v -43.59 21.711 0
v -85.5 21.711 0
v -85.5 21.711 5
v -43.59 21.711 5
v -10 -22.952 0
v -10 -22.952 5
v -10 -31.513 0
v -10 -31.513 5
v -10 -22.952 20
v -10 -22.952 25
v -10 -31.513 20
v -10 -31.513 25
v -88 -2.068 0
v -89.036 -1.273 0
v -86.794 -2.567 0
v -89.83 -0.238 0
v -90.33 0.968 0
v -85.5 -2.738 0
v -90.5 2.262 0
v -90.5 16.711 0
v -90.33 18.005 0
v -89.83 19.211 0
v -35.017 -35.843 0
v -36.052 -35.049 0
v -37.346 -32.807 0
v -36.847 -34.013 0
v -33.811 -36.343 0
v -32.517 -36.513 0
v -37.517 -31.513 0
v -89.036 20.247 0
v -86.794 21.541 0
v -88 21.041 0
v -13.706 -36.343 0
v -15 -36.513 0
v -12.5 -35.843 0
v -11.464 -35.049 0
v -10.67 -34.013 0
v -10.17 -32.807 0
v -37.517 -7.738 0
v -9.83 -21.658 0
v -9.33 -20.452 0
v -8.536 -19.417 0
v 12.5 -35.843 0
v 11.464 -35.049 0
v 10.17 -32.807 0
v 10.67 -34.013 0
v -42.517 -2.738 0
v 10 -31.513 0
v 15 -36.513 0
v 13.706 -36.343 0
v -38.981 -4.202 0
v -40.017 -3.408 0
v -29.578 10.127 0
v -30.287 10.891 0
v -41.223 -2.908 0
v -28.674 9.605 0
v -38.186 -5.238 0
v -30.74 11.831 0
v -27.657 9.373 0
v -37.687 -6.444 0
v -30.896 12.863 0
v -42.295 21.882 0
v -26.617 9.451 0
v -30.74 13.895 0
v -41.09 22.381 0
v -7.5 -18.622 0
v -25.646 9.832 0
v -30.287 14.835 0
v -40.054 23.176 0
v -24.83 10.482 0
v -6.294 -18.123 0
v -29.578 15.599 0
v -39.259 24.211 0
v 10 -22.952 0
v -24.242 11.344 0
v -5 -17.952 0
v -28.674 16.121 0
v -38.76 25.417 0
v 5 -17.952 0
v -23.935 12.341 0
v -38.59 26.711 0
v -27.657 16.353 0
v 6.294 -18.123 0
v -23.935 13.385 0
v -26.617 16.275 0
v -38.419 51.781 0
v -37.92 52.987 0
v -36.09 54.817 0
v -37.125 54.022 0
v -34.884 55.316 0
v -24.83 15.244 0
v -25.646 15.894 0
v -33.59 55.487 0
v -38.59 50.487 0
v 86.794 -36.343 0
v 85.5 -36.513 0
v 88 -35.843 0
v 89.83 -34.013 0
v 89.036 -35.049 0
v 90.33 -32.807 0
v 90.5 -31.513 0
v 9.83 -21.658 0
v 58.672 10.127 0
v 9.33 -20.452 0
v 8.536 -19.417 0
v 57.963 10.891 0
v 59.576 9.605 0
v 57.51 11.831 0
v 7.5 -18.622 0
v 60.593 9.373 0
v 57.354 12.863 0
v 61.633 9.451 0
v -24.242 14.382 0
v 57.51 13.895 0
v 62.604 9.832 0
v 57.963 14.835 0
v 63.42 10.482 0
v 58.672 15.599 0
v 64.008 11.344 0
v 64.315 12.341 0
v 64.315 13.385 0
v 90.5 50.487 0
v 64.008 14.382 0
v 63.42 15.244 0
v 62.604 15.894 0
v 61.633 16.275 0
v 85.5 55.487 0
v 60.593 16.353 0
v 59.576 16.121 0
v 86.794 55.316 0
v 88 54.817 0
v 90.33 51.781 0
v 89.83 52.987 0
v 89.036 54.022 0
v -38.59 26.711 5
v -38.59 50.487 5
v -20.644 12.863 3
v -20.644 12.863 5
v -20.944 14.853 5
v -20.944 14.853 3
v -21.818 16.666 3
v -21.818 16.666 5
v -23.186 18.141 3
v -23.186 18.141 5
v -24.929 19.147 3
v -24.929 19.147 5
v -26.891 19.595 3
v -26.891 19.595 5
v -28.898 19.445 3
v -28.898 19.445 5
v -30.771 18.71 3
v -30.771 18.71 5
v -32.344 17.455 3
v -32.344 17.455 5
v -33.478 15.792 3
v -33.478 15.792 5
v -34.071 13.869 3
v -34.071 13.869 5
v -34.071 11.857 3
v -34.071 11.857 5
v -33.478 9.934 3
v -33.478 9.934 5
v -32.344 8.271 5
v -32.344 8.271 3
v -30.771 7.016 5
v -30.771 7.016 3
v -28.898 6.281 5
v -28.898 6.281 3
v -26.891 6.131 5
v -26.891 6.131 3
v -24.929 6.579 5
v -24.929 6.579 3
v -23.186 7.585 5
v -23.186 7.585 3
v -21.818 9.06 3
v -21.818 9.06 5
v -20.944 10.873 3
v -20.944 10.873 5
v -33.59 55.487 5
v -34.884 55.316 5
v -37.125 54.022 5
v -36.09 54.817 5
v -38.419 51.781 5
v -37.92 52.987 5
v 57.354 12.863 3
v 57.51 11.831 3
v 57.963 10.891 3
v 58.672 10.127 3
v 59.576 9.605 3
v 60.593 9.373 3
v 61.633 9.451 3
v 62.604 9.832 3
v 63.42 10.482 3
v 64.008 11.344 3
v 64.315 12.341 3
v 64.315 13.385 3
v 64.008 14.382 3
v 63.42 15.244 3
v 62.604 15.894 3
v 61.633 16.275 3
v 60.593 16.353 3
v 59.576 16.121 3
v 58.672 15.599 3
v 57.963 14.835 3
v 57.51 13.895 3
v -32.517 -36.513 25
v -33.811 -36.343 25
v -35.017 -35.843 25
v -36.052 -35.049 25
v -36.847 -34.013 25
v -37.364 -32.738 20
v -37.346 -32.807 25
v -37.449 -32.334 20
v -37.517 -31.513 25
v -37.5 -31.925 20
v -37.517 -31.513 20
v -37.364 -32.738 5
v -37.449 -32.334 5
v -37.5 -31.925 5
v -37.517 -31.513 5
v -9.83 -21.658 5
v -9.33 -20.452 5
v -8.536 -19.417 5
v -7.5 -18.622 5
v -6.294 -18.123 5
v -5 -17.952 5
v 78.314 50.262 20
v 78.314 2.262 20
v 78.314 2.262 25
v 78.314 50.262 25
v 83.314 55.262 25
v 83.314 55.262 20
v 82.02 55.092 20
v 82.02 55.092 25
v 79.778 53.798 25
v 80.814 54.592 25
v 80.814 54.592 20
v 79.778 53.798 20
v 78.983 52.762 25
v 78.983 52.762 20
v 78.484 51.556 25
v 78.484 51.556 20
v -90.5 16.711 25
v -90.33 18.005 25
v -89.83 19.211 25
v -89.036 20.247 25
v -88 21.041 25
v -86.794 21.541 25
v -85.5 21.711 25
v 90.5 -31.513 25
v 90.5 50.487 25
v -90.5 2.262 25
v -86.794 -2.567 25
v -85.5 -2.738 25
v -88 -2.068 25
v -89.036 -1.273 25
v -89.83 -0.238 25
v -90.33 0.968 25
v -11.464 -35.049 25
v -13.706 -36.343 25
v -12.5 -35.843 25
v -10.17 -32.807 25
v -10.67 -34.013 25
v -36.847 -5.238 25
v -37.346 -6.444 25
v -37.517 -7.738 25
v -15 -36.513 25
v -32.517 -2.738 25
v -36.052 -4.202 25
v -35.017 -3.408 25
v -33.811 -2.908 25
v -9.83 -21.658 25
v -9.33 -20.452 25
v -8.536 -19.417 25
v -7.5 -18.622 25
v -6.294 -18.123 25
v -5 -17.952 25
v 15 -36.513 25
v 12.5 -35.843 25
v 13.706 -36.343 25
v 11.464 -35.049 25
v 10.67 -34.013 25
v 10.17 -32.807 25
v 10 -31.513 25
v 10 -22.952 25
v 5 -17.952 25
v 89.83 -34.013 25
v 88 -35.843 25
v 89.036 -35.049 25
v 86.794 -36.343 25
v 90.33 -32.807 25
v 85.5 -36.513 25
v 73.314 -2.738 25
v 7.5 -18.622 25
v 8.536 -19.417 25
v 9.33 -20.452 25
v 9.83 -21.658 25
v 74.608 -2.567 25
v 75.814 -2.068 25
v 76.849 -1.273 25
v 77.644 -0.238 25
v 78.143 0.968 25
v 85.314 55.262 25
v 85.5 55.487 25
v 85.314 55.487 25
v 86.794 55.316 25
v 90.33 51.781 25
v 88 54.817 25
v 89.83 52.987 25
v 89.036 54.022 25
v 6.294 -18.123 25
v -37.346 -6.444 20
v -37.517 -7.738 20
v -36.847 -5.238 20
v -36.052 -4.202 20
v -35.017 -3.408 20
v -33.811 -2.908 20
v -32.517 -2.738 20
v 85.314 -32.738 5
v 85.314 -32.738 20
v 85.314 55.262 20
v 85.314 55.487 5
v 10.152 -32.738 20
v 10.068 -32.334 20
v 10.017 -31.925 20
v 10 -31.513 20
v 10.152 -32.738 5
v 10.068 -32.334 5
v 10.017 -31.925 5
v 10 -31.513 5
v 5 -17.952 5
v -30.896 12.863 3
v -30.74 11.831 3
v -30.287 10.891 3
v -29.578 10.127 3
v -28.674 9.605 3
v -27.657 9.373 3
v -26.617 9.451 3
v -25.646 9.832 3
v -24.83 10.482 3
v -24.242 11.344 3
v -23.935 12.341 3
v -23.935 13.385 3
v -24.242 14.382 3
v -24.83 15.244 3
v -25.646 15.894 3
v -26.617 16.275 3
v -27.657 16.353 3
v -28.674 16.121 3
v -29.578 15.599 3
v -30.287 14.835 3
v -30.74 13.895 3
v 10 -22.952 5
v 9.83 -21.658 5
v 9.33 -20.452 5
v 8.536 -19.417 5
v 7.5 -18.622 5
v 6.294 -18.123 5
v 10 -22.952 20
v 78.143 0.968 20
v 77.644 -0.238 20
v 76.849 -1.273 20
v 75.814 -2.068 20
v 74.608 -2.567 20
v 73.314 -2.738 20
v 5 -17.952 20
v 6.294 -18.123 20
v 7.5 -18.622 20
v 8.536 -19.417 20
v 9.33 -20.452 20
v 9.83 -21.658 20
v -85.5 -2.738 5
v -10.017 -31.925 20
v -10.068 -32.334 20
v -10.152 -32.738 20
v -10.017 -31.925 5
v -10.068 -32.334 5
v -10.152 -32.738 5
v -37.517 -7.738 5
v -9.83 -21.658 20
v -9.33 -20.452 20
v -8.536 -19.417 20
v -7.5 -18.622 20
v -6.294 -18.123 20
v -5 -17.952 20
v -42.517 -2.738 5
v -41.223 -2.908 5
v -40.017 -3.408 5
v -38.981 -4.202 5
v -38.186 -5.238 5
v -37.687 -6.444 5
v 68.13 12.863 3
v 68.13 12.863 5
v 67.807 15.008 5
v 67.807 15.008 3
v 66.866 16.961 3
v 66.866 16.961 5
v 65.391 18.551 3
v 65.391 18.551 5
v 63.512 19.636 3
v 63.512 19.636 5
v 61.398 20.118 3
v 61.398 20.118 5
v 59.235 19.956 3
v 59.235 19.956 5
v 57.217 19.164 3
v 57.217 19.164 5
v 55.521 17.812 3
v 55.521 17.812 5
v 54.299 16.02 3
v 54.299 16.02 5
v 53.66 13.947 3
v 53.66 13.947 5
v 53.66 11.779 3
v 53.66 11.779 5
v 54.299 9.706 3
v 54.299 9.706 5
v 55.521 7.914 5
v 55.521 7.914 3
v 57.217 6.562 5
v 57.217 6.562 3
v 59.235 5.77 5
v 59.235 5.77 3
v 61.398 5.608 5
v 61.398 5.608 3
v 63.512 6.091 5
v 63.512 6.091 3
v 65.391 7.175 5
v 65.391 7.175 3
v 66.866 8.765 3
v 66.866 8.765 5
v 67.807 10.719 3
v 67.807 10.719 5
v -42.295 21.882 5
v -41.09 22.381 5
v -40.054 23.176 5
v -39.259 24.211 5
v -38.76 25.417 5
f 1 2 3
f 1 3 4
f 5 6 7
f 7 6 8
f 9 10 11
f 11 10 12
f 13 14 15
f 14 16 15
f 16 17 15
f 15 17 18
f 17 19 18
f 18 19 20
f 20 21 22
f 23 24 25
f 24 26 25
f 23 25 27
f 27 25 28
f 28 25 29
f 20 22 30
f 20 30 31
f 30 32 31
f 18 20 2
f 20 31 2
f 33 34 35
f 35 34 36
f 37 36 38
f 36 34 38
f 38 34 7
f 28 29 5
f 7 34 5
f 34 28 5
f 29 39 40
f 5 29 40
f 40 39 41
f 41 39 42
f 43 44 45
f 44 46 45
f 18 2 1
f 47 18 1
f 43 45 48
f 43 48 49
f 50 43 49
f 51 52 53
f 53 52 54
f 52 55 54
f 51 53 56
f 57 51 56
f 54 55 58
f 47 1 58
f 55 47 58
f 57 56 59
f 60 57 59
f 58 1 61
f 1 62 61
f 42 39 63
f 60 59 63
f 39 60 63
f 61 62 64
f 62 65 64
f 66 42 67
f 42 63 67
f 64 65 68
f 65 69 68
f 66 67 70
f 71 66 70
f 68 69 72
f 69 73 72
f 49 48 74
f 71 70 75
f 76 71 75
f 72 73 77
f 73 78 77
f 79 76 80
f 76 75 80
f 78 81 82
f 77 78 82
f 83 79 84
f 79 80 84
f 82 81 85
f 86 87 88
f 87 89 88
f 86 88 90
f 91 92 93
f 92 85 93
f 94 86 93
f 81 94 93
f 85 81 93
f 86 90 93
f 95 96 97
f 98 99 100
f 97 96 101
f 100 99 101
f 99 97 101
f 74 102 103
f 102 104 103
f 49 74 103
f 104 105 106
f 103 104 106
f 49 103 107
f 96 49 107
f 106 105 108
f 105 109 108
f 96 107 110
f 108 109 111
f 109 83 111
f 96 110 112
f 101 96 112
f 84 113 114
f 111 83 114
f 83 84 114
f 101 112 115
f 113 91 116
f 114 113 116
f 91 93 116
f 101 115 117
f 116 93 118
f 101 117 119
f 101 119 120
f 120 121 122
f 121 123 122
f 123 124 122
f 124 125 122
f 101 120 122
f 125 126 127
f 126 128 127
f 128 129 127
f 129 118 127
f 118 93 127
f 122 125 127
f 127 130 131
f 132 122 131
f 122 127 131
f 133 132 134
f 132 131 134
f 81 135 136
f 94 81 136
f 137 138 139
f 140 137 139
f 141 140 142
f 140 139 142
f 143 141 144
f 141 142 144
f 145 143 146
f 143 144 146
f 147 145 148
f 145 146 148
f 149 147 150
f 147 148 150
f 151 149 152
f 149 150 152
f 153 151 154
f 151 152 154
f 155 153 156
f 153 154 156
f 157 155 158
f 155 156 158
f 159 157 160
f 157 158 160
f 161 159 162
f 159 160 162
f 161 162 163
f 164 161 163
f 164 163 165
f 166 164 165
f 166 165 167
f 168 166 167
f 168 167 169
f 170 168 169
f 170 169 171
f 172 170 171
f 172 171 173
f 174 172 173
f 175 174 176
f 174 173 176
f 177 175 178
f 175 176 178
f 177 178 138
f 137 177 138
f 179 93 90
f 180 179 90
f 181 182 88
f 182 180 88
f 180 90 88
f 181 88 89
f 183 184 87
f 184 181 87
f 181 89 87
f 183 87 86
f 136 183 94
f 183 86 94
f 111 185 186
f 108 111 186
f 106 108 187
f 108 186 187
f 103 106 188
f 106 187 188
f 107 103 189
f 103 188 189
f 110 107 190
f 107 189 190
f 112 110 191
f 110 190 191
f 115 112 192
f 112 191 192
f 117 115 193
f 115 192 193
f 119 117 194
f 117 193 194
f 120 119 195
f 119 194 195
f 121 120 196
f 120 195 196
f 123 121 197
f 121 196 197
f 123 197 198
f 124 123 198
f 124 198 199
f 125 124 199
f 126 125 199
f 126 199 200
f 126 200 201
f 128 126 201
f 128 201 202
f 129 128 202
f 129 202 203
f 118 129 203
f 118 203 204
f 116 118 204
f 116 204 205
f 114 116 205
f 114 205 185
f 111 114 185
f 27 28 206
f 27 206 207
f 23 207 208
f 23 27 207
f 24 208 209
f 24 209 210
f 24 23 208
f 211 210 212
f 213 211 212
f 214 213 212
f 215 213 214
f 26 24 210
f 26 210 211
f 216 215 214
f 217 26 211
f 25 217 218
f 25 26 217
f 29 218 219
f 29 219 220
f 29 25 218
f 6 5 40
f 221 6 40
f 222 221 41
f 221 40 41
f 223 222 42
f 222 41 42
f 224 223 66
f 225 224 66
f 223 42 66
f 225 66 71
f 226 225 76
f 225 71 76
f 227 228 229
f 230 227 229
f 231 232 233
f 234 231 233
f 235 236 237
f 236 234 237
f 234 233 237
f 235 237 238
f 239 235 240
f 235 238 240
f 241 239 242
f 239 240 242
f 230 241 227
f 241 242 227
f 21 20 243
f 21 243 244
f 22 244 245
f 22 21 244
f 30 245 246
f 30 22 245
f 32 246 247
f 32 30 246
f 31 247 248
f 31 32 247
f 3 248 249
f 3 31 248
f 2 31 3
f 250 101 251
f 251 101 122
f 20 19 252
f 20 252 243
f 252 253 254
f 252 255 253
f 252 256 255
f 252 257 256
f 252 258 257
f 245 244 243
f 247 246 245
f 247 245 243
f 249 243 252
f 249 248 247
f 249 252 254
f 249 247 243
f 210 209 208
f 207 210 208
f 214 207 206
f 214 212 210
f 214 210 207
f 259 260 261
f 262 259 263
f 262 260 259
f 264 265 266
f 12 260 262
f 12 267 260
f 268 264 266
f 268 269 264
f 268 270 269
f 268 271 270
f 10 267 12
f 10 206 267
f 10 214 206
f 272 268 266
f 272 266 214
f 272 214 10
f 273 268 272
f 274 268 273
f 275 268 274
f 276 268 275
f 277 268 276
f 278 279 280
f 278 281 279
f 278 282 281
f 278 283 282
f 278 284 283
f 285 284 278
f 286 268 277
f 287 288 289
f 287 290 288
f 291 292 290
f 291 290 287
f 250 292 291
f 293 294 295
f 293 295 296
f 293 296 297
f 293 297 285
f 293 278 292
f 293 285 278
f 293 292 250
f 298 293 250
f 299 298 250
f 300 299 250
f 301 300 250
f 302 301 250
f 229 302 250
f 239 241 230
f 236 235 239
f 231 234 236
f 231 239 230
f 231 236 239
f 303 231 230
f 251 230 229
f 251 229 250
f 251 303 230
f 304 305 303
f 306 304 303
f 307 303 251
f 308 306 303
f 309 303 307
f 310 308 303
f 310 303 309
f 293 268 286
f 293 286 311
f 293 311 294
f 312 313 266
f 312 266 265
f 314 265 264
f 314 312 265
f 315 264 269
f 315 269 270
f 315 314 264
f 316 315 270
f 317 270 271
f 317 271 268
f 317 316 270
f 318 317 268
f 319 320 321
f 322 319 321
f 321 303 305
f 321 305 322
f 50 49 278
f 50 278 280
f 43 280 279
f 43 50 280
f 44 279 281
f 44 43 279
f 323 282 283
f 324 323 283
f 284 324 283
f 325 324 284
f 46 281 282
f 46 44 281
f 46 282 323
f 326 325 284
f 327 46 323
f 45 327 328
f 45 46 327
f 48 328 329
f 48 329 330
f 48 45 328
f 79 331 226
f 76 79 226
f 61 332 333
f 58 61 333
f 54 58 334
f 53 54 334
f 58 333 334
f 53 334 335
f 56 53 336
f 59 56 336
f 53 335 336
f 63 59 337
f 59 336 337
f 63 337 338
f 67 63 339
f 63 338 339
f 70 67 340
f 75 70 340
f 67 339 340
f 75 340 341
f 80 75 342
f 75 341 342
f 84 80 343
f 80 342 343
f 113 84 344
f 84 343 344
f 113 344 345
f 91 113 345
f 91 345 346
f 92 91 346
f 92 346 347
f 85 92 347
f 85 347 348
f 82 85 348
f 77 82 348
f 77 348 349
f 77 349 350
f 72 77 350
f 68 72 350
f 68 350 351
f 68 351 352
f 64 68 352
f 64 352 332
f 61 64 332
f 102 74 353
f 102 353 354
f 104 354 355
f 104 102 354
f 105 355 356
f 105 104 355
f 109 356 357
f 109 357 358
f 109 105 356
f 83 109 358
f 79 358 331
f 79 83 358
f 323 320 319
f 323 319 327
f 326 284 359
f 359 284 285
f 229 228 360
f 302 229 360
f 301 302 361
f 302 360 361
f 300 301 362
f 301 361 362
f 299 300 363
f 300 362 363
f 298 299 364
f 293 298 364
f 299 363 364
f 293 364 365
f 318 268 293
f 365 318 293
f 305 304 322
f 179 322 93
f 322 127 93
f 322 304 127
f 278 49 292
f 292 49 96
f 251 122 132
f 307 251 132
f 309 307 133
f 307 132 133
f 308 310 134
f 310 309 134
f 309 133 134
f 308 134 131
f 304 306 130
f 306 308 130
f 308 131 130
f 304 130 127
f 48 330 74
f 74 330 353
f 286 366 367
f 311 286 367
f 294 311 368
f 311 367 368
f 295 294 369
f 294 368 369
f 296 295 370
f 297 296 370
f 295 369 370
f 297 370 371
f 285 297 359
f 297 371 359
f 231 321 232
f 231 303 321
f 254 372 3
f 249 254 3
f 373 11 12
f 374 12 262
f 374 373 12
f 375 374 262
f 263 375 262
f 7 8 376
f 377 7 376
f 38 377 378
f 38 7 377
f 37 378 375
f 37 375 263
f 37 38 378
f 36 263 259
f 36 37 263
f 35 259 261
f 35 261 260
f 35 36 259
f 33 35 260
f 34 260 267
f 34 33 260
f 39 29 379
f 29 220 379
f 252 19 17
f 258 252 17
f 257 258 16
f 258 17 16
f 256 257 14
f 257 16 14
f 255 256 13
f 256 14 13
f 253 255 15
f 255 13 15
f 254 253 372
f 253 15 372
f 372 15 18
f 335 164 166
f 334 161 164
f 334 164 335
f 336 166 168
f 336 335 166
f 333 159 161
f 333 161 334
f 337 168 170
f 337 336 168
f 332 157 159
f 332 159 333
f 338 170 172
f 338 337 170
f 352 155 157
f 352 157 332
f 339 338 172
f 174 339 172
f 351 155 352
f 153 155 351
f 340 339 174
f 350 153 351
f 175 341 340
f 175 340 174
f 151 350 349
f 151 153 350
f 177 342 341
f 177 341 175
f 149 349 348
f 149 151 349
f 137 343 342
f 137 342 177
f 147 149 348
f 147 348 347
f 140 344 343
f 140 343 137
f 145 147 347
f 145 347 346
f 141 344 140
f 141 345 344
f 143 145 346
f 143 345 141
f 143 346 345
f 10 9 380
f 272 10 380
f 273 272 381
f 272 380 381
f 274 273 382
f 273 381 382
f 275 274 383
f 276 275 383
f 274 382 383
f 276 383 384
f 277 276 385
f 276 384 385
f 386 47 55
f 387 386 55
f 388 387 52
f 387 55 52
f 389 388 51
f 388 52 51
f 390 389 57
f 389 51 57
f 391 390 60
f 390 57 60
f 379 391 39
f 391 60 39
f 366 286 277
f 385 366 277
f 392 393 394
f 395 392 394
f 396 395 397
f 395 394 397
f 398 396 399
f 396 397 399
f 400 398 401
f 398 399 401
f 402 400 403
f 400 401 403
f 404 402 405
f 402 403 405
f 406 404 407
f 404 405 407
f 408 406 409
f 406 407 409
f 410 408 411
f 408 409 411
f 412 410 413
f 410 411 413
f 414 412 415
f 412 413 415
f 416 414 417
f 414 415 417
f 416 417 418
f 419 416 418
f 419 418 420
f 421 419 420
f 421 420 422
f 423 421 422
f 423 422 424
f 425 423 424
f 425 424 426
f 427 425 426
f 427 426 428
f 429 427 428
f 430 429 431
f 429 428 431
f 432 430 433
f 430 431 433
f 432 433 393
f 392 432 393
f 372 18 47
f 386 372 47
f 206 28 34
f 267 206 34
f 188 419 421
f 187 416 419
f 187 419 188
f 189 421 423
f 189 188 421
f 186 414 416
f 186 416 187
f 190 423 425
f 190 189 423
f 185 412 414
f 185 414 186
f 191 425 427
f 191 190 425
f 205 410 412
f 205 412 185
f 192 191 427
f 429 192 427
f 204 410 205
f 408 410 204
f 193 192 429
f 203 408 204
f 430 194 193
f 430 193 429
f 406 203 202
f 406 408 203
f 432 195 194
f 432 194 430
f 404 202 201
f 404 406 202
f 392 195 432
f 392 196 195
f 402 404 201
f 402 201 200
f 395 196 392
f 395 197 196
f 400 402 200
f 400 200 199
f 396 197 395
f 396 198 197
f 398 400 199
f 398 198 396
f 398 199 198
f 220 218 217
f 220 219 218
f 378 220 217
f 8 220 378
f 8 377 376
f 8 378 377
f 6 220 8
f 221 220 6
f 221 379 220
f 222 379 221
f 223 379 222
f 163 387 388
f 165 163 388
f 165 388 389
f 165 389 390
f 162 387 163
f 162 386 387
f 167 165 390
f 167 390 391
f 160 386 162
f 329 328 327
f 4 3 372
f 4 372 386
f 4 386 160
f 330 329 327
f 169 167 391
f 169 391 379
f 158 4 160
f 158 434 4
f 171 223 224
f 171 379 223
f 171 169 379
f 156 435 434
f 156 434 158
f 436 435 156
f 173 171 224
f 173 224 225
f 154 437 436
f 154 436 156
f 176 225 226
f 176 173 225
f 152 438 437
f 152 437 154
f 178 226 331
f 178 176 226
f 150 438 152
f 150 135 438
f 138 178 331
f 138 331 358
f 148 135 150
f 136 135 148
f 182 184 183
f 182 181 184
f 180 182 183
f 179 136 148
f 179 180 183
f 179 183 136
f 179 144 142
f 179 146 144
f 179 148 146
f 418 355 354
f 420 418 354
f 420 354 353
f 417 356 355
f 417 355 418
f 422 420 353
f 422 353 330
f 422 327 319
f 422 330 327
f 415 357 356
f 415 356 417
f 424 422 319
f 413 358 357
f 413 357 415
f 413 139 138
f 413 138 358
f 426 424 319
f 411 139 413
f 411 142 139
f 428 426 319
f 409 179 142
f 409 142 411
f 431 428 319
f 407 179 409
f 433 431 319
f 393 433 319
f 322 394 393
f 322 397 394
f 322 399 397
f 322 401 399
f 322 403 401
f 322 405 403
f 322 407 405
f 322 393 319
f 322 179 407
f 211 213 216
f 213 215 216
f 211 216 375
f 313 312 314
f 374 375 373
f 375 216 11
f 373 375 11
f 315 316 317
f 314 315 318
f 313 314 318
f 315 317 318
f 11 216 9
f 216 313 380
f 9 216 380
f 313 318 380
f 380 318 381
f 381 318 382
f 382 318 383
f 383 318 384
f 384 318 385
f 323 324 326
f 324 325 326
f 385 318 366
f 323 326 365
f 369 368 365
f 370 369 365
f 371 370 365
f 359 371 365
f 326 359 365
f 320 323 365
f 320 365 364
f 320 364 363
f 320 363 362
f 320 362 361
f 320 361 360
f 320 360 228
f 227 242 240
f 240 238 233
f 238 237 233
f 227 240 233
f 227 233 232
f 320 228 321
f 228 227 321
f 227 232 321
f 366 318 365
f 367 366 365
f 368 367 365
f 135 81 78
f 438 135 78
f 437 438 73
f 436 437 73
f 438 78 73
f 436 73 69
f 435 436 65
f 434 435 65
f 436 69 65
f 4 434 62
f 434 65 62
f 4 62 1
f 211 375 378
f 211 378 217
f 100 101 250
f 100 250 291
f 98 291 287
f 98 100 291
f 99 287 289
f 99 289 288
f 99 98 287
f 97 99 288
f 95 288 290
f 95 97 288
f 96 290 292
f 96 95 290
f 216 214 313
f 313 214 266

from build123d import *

# Parameters (mm, degrees)
F1_DEPTH     = 25
F4_DEPTH     = 25
F6_DEPTH     = 20
F7_W         = 51.9104144033
F7_H         = 33.7755738664
F7_W_2       = 52.9833799657
F8_DEPTH     = 25
F9_W         = 5
F9_H         = 24.4488522671
F10_DEPTH    = 20
F11_W        = 120.8302378654
F11_H        = 15
F12_DEPTH    = 30
F14_DEPTH    = 6
F15_R        = 7.2754238601
F15_R_2      = 3.5
F15_R_3      = 6.751082942
F16_DEPTH    = 2
F17_W        = 5
F17_H        = 5
F18_DEPTH    = 58
F19_DEPTH    = 2
F20_T1_DEPTH = 5
F20_T3_DEPTH = 5
F20_T5_DEPTH = 50
F20_T7_DEPTH = 30
F20_T9_DEPTH = 30


# Not quite as in the source:
# - a fillet or chamfer that OpenCascade refuses, or shapes differently, is made with other operations: its cross-section is extruded or revolved along the edge and cut away or added
# - a feature names something its author has since deleted; it is built from what else it names


with BuildPart() as f1:
    # F0 (on Top) → F1 (new body)
    with BuildSketch(Plane.XY):
        Polygon((-25, 55.486739397), (-90.4999962505, 55.486739397), (-90.4999962505, -36.513260603), (90.5000037495, -36.513260603), (90.5000037495, 55.486739397), (25, 55.486739397), align=None)
    extrude(amount=F1_DEPTH)

    # F3 (on face) → F4 (cut)
    with BuildSketch(Plane.XY.offset(25)):
        Polygon((10, -17.952421695), (0, -17.952421695), (-10, -17.952421695), (-10, -30.3189372783), (0, -30.3189372783), (10, -30.3189372783), align=None)
        Polygon((10, -36.513260603), (10, -30.3189372783), (0, -30.3189372783), (-10, -30.3189372783), (-10, -36.513260603), align=None)
    extrude(amount=-F4_DEPTH, mode=Mode.SUBTRACT)

    # F5 (on face) → F6 (cut)
    with BuildSketch(Plane.XY.offset(25)):
        Polygon((83.3136215806, -2.7376867365), (83.3136215806, 55.486739397), (-90.4999962505, 55.486739397), (-90.4999962505, -36.513260603), (-37.5166162848, -36.513260603), (-37.5166162848, -2.7376867365), align=None)
    extrude(amount=-F6_DEPTH, mode=Mode.SUBTRACT)

    # F7 (on face) → F8 (cut)
    with BuildSketch(Plane.XY.offset(5)):
        with Locations((-64.5447890489, 38.5989524638)):
            Rectangle(F7_W, F7_H)
        with Locations((-64.0083062677, -19.6254736697)):
            Rectangle(F7_W_2, F7_H)
    extrude(amount=-F8_DEPTH, mode=Mode.SUBTRACT)

    # F9 (on face) → F10 (join)
    with BuildSketch(Plane.XY.offset(5)):
        with Locations((-87.9999962505, 9.486739397)):
            Rectangle(F9_W, F9_H)
    extrude(amount=F10_DEPTH)

    # F11 (on face) → F12 (cut)
    with BuildSketch(Plane(origin=(0, -2.7376867365, 0), x_dir=(-1, 0, 0), z_dir=(0, 1, 0))):
        with Locations((-22.8985026479, 12.5)):
            Rectangle(F11_W, F11_H)
    extrude(amount=-F12_DEPTH, mode=Mode.SUBTRACT)

    # F13 (on face) → F14 (cut)
    with BuildSketch(Plane.XY.offset(5)):
        with BuildLine():
            ThreePointArc((64.3544293493, 12.8630390391), (60.8544293493, 16.3630390391), (57.3544293493, 12.8630390391))
            Line((57.3544293493, 12.8630390391), (60.8544293493, 12.8630390391))
            Line((60.8544293493, 12.8630390391), (64.3544293493, 12.8630390391))
        make_face()
        with BuildLine():
            Line((60.8544293493, 12.8630390391), (57.3544293493, 12.8630390391))
            ThreePointArc((57.3544293493, 12.8630390391), (60.8544293493, 9.3630390391), (64.3544293493, 12.8630390391))
            Line((64.3544293493, 12.8630390391), (60.8544293493, 12.8630390391))
        make_face()
        with BuildLine():
            ThreePointArc((-23.8955706507, 12.8630390391), (-27.3955706507, 16.3630390391), (-30.8955706507, 12.8630390391))
            Line((-30.8955706507, 12.8630390391), (-27.3955706507, 12.8630390391))
            Line((-27.3955706507, 12.8630390391), (-23.8955706507, 12.8630390391))
        make_face()
        with BuildLine():
            Line((-27.3955706507, 12.8630390391), (-30.8955706507, 12.8630390391))
            ThreePointArc((-30.8955706507, 12.8630390391), (-27.3955706507, 9.3630390391), (-23.8955706507, 12.8630390391))
            Line((-23.8955706507, 12.8630390391), (-27.3955706507, 12.8630390391))
        make_face()
    extrude(amount=-F14_DEPTH, mode=Mode.SUBTRACT)

    # F15 (on face) → F16 (cut)
    with BuildSketch(Plane.XY.offset(5)):
        with Locations((60.8544293493, 12.8630390391)):
            Circle(F15_R)
        with Locations((60.8544293493, 12.8630390391)):
            Circle(F15_R_2, mode=Mode.SUBTRACT)
        with Locations((-27.3955706507, 12.8630390391)):
            Circle(F15_R_3)
        with Locations((-27.3955706507, 12.8630390391)):
            Circle(F15_R_2, mode=Mode.SUBTRACT)
    extrude(amount=-F16_DEPTH, mode=Mode.SUBTRACT)

    # F17 (on face) → F18 (join)
    with BuildSketch(Plane(origin=(0, -2.7376867365, 0), x_dir=(-1, 0, 0), z_dir=(0, 1, 0))):
        with Locations((-80.8136215806, 22.5)):
            Rectangle(F17_W, F17_H)
    extrude(amount=F18_DEPTH)

    # F19 (cut): a face of the model
    f19_faces = [f1.faces().sort_by_distance(p)[0] for p in [
        (83.3136215806, 11.4118039273, 12.5084721811),
    ]]
    extrude(f19_faces, amount=-F19_DEPTH, mode=Mode.SUBTRACT)

    # F20: fillet of radius 5 on 17 edges, made by hand

    # F20_s2 → F20_t1 (join)
    with BuildSketch(Plane.XY.offset(20)):
        with BuildLine():
            ThreePointArc((-10, -22.952421695), (-8.5355339059, -19.4168877891), (-5, -17.952421695))
            Line((-5, -17.952421695), (-10, -17.952421695))
            Line((-10, -17.952421695), (-10, -22.952421695))
        make_face()
        with BuildLine():
            ThreePointArc((5, -17.952421695), (8.5355339059, -19.4168877891), (10, -22.952421695))
            Line((10, -22.952421695), (10, -17.952421695))
            Line((10, -17.952421695), (5, -17.952421695))
        make_face()
        with BuildLine():
            ThreePointArc((78.3136215806, 2.2623132635), (76.8491554865, -1.2732206424), (73.3136215806, -2.7376867365))
            Line((73.3136215806, -2.7376867365), (78.3136215806, -2.7376867365))
            Line((78.3136215806, -2.7376867365), (78.3136215806, 2.2623132635))
        make_face()
    extrude(amount=F20_T1_DEPTH)

    # F20_s4 → F20_t3 (join)
    with BuildSketch(Plane.XY):
        with BuildLine():
            ThreePointArc((-10, -22.952421695), (-8.5355339059, -19.4168877891), (-5, -17.952421695))
            Line((-5, -17.952421695), (-10, -17.952421695))
            Line((-10, -17.952421695), (-10, -22.952421695))
        make_face()
        with BuildLine():
            ThreePointArc((10, -22.952421695), (8.5355339059, -19.4168877891), (5, -17.952421695))
            Line((5, -17.952421695), (10, -17.952421695))
            Line((10, -17.952421695), (10, -22.952421695))
        make_face()
        with BuildLine():
            ThreePointArc((-42.5166162848, -2.7376867365), (-38.9810823789, -4.2021528306), (-37.5166162848, -7.7376867365))
            Line((-37.5166162848, -7.7376867365), (-37.5166162848, -2.7376867365))
            Line((-37.5166162848, -2.7376867365), (-42.5166162848, -2.7376867365))
        make_face()
        with BuildLine():
            ThreePointArc((-38.5895818472, 26.7111655306), (-40.0540479413, 23.1756316247), (-43.5895818472, 21.7111655306))
            Line((-43.5895818472, 21.7111655306), (-38.5895818472, 21.7111655306))
            Line((-38.5895818472, 21.7111655306), (-38.5895818472, 26.7111655306))
        make_face()
    extrude(amount=F20_T3_DEPTH)

    # F20_s6 → F20_t5 (cut)
    with BuildSketch(Plane.XY.offset(-12.5)):
        with BuildLine():
            ThreePointArc((-10, -31.513260603), (-11.4644660941, -35.0487945089), (-15, -36.513260603))
            Line((-15, -36.513260603), (-10, -36.513260603))
            Line((-10, -36.513260603), (-10, -31.513260603))
        make_face()
        with BuildLine():
            ThreePointArc((15, -36.513260603), (11.4644660941, -35.0487945089), (10, -31.513260603))
            Line((10, -31.513260603), (10, -36.513260603))
            Line((10, -36.513260603), (15, -36.513260603))
        make_face()
        with BuildLine():
            ThreePointArc((-32.5166162848, -36.513260603), (-36.0521501908, -35.0487945089), (-37.5166162848, -31.513260603))
            Line((-37.5166162848, -31.513260603), (-37.5166162848, -36.513260603))
            Line((-37.5166162848, -36.513260603), (-32.5166162848, -36.513260603))
        make_face()
        with BuildLine():
            ThreePointArc((90.5000037495, 50.486739397), (89.0355376554, 54.022273303), (85.5000037495, 55.486739397))
            Line((85.5000037495, 55.486739397), (90.5000037495, 55.486739397))
            Line((90.5000037495, 55.486739397), (90.5000037495, 50.486739397))
        make_face()
        with BuildLine():
            ThreePointArc((90.5000037495, -31.513260603), (89.0355376554, -35.0487945089), (85.5000037495, -36.513260603))
            Line((85.5000037495, -36.513260603), (90.5000037495, -36.513260603))
            Line((90.5000037495, -36.513260603), (90.5000037495, -31.513260603))
        make_face()
        with BuildLine():
            ThreePointArc((-90.4999962505, 16.7111655306), (-89.0355301565, 20.2466994365), (-85.4999962505, 21.7111655306))
            Line((-85.4999962505, 21.7111655306), (-90.4999962505, 21.7111655306))
            Line((-90.4999962505, 21.7111655306), (-90.4999962505, 16.7111655306))
        make_face()
        with BuildLine():
            ThreePointArc((-90.4999962505, 2.2623132635), (-89.0355301565, -1.2732206424), (-85.4999962505, -2.7376867365))
            Line((-85.4999962505, -2.7376867365), (-90.4999962505, -2.7376867365))
            Line((-90.4999962505, -2.7376867365), (-90.4999962505, 2.2623132635))
        make_face()
    extrude(amount=F20_T5_DEPTH, mode=Mode.SUBTRACT)

    # F20_s8 → F20_t7 (cut)
    with BuildSketch(Plane.XY.offset(-12.5)):
        with BuildLine():
            ThreePointArc((-33.5895818472, 55.486739397), (-37.1251157531, 54.022273303), (-38.5895818472, 50.486739397))
            Line((-38.5895818472, 50.486739397), (-38.5895818472, 55.486739397))
            Line((-38.5895818472, 55.486739397), (-33.5895818472, 55.486739397))
        make_face()
    extrude(amount=F20_T7_DEPTH, mode=Mode.SUBTRACT)

    # F20_s10 → F20_t9 (cut)
    with BuildSketch(Plane.XY.offset(7.5)):
        with BuildLine():
            ThreePointArc((83.3136215806, 55.2623132635), (79.7780876747, 53.7978471694), (78.3136215806, 50.2623132635))
            Line((78.3136215806, 50.2623132635), (78.3136215806, 55.2623132635))
            Line((78.3136215806, 55.2623132635), (83.3136215806, 55.2623132635))
        make_face()
        with BuildLine():
            ThreePointArc((-37.5166162848, -7.7376867365), (-36.0521501908, -4.2021528306), (-32.5166162848, -2.7376867365))
            Line((-32.5166162848, -2.7376867365), (-37.5166162848, -2.7376867365))
            Line((-37.5166162848, -2.7376867365), (-37.5166162848, -7.7376867365))
        make_face()
    extrude(amount=F20_T9_DEPTH, mode=Mode.SUBTRACT)


solid = f1.part
